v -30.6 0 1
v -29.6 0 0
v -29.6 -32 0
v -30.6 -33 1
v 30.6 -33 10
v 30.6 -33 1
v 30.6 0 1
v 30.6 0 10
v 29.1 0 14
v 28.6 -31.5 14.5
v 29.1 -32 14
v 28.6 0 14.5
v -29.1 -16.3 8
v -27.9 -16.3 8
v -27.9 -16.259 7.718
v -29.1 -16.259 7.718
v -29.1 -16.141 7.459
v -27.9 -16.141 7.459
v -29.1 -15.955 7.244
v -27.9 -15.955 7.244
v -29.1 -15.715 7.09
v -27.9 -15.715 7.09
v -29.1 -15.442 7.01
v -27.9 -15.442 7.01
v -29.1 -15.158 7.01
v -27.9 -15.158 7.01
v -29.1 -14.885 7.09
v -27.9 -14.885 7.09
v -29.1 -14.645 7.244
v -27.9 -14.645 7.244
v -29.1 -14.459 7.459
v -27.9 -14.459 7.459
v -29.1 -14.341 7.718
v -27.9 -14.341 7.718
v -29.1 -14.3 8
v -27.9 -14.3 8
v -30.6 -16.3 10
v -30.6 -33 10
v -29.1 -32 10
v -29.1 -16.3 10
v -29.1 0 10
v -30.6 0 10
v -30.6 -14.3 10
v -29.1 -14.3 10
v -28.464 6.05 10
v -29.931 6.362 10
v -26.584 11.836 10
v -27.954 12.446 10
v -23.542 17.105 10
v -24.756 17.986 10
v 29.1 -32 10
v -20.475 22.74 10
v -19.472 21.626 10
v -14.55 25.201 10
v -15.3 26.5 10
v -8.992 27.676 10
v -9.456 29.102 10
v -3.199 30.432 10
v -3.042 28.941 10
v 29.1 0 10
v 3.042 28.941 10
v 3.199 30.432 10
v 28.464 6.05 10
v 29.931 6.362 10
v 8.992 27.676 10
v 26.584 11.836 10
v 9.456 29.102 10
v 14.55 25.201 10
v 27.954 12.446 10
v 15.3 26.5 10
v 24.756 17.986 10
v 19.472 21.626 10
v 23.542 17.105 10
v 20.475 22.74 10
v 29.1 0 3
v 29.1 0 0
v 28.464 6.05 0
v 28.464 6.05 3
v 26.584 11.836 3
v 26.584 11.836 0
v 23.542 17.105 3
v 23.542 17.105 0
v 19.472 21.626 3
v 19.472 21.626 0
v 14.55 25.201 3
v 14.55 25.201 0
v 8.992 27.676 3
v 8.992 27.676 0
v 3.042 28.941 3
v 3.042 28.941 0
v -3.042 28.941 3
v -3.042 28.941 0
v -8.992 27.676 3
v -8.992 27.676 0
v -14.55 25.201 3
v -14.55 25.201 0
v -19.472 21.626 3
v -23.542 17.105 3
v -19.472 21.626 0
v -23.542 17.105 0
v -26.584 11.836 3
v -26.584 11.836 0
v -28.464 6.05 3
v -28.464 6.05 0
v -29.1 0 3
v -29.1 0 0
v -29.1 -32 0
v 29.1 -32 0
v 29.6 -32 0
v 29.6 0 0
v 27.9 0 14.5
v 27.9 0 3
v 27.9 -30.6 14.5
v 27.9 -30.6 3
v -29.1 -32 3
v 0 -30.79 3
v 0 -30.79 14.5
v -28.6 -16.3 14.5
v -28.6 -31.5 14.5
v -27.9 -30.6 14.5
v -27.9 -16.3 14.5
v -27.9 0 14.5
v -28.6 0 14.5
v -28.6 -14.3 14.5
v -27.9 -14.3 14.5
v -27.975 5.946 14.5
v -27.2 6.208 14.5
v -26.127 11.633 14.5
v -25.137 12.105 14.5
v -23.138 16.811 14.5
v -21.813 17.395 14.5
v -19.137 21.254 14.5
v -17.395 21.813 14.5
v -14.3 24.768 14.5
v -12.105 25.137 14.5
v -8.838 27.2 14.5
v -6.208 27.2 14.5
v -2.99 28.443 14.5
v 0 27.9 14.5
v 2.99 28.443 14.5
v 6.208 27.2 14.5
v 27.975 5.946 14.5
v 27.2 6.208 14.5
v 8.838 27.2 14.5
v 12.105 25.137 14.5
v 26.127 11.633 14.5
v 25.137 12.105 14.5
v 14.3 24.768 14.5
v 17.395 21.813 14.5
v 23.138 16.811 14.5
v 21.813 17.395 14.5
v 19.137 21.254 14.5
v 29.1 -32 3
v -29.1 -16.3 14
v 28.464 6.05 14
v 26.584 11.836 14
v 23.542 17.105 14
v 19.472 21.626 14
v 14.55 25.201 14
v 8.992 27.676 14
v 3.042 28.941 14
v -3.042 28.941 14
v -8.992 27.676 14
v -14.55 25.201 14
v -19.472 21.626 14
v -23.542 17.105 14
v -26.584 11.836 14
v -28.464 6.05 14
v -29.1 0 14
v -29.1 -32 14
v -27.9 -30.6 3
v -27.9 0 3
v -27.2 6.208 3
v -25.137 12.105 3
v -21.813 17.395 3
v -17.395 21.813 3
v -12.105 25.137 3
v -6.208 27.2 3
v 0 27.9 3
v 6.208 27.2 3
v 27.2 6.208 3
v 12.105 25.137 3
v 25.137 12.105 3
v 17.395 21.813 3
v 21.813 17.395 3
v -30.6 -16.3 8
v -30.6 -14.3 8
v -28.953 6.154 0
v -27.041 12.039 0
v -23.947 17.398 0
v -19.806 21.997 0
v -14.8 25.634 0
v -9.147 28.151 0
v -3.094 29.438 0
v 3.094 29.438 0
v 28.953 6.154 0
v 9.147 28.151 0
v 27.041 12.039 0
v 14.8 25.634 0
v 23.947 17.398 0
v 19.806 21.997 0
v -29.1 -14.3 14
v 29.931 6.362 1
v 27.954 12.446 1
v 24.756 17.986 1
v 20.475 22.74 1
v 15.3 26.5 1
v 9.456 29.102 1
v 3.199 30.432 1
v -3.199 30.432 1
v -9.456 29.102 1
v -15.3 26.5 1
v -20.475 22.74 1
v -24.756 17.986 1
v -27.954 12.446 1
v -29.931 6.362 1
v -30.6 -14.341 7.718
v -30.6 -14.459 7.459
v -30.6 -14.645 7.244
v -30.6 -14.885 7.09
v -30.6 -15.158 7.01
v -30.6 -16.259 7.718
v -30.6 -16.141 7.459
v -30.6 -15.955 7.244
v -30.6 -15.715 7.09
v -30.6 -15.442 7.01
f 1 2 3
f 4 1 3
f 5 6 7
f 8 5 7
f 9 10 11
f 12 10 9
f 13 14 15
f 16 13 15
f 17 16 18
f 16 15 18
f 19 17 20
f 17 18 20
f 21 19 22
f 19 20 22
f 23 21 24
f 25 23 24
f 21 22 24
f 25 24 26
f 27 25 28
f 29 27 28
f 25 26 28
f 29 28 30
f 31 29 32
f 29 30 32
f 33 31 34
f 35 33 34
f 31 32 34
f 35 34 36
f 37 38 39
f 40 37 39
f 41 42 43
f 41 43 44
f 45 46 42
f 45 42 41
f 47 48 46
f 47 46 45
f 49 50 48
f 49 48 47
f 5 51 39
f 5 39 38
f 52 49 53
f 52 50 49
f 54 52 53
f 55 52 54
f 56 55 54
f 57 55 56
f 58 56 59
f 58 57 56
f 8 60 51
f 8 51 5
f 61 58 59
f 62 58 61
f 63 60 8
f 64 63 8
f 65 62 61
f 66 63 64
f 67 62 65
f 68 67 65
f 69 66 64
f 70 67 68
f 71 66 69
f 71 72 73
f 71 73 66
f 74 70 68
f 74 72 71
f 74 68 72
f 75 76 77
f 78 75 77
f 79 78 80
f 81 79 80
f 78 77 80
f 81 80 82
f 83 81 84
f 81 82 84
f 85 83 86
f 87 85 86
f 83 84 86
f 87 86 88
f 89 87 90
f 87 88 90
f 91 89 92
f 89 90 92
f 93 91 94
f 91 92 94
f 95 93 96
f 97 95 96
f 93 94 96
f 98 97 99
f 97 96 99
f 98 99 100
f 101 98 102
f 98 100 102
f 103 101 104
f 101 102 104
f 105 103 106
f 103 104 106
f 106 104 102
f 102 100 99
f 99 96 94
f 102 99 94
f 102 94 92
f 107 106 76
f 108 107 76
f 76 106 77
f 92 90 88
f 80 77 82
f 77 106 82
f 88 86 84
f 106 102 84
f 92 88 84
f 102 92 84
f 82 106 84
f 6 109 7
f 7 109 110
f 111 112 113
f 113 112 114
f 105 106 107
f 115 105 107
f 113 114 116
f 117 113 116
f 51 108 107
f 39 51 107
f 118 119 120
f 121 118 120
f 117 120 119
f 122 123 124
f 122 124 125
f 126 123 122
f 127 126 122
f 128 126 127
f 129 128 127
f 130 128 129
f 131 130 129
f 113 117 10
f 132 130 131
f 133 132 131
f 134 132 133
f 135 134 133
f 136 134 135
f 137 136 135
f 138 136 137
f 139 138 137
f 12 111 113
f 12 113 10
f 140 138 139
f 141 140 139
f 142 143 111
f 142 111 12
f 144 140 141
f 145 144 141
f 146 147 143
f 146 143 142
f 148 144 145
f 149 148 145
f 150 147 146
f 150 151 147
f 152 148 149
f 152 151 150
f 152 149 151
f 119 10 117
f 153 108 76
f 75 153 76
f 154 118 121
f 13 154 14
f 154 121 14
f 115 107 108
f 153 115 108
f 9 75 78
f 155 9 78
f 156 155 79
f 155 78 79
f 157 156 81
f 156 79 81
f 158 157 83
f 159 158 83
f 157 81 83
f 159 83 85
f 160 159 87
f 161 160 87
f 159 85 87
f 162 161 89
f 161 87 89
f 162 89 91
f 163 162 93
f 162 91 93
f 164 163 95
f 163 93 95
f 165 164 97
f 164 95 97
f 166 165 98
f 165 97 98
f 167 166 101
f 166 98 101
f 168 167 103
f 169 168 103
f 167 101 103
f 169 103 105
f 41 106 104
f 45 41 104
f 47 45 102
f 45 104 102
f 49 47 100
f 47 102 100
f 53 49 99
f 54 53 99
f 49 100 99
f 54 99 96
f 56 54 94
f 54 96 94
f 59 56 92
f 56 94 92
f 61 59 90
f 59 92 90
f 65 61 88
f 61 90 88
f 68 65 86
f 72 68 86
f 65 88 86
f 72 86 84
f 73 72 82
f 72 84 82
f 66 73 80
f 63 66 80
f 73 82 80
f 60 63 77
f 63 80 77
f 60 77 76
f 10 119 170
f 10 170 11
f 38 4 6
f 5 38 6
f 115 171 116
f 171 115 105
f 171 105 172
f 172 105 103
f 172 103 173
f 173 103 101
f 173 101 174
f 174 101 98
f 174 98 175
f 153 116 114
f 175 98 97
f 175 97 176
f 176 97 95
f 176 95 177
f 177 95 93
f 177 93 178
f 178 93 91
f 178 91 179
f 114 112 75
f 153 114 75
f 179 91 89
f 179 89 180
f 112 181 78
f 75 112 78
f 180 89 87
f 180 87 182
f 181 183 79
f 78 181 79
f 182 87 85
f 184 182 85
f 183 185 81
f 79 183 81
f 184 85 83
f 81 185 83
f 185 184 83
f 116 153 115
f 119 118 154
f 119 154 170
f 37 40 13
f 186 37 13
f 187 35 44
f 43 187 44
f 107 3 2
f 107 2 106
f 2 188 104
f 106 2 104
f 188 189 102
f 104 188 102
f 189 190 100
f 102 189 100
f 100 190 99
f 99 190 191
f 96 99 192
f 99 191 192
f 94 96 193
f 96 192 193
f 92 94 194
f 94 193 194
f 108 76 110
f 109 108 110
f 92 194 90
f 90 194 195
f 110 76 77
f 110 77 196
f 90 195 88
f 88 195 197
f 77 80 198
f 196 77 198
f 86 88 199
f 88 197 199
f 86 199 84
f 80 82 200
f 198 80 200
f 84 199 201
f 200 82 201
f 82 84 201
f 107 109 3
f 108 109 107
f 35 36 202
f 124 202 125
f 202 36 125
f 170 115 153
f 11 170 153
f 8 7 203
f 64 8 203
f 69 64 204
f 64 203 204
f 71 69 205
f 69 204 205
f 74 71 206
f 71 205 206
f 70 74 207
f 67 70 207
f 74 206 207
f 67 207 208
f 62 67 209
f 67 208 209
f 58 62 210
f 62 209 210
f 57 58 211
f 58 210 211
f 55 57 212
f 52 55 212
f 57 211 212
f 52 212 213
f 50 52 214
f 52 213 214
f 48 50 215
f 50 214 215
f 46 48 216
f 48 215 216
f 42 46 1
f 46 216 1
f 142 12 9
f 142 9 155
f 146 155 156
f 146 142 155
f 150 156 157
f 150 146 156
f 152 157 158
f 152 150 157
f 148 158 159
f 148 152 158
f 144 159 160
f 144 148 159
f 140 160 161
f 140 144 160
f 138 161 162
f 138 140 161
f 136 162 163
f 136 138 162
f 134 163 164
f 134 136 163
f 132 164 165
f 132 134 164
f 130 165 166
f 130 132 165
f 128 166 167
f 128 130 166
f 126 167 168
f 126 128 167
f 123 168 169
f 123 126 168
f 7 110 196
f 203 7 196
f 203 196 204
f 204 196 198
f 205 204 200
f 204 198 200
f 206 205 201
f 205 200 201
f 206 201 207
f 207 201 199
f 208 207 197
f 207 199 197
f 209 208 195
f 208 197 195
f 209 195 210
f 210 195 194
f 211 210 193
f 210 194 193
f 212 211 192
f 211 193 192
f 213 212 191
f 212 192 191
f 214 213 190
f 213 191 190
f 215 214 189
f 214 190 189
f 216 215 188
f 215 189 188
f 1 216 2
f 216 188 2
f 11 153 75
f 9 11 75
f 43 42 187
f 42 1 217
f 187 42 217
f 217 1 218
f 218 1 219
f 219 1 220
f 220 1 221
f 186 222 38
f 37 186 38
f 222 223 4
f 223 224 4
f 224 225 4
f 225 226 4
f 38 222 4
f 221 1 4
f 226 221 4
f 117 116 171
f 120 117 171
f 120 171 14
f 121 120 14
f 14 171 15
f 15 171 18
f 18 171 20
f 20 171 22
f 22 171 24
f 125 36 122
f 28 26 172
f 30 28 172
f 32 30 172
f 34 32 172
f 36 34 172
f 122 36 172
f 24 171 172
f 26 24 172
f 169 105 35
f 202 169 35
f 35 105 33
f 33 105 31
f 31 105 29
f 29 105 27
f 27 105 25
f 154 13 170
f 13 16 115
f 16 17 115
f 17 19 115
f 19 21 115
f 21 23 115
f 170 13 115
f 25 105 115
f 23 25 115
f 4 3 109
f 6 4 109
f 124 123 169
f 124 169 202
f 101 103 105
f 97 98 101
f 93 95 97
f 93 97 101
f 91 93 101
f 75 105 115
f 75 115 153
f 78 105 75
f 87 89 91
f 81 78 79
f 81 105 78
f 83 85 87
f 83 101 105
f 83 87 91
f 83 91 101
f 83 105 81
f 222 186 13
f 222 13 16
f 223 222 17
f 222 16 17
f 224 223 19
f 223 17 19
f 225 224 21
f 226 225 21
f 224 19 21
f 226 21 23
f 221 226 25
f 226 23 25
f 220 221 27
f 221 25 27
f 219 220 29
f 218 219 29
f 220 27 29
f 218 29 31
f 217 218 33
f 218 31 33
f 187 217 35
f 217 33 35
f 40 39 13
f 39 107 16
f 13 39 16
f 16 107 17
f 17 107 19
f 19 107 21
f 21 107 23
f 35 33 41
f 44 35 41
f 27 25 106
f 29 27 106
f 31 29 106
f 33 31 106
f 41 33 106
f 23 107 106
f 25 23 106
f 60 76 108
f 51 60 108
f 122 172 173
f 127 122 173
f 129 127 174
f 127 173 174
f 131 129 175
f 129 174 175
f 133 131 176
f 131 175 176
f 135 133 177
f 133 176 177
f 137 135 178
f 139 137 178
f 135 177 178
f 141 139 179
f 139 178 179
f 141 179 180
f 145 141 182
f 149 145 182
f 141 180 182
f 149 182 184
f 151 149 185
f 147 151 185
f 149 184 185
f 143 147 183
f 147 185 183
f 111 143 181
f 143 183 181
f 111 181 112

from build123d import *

# Parameters (mm, degrees)
F3_DEPTH  = 3
F4_DEPTH  = 10
F5_SIZE   = 0.99999
F8_DEPTH  = 11.5
F9_SIZE   = 0.5
F11_DEPTH = 25


# Not quite as in the source:
# - a fillet or chamfer is up to 0.001 mm smaller than in the source, because OpenCascade refuses the exact size
# - a feature of the source that left no trace in its solid (it failed there, or was rolled back) is left out
# - a feature names something its author has since deleted; it is built from what else it names


with BuildPart() as f3:
    # F2 (on Top) → F3 (new body)
    with BuildSketch(Plane.XY):
        with BuildLine():
            Line((29.1, -9.4630861774), (29.1, 0))
            ThreePointArc((29.1, 0), (0, -29.1), (-29.1, 0))
            Line((-29.1, 0), (-29.1, -9.4630861774))
            ThreePointArc((-29.1, -9.4630861774), (0, -30.6), (29.1, -9.4630861774))
        make_face()
        with BuildLine():
            ThreePointArc((-29.1, 0), (0, -29.1), (29.1, 0))
            Line((29.1, 0), (-29.1, 0))
        make_face()
        with BuildLine():
            Line((-29.1, 0), (29.1, 0))
            ThreePointArc((29.1, 0), (0, 29.1), (-29.1, 0))
        make_face()
        with BuildLine():
            Line((29.1, -32), (29.1, -9.4630861774))
            ThreePointArc((29.1, -9.4630861774), (0, -30.6), (-29.1, -9.4630861774))
            Line((-29.1, -9.4630861774), (-29.1, -32))
            Line((-29.1, -32), (29.1, -32))
        make_face()
    extrude(amount=F3_DEPTH)


with BuildPart() as f4:
    # F2 (on Top) → F4 (new body)
    with BuildSketch(Plane.XY):
        with BuildLine():
            ThreePointArc((30.6, 0), (30.2226736077, -4.7906158268), (29.1, -9.4630861774))
            Line((29.1, -9.4630861774), (29.1, -32))
            Line((29.1, -32), (-29.1, -32))
            Line((-29.1, -32), (-29.1, -9.4630861774))
            ThreePointArc((-29.1, -9.4630861774), (-30.2226736077, -4.7906158268), (-30.6, 0))
            Line((-30.6, 0), (-30.6, -33))
            Line((-30.6, -33), (30.6, -33))
            Line((30.6, -33), (30.6, 0))
        make_face()
        with BuildLine():
            ThreePointArc((-29.1, 0), (0, 29.1), (29.1, 0))
            Line((29.1, 0), (29.1, -9.4630861774))
            ThreePointArc((29.1, -9.4630861774), (30.2226736077, -4.7906158268), (30.6, 0))
            ThreePointArc((30.6, 0), (0, 30.6), (-30.6, 0))
            ThreePointArc((-30.6, 0), (-30.2226736077, -4.7906158268), (-29.1, -9.4630861774))
            Line((-29.1, -9.4630861774), (-29.1, 0))
        make_face()
    extrude(amount=F4_DEPTH)

    # F5 (size 1 in the source; OpenCascade refuses exactly that, so slightly less here)
    f5_edges = [f4.edges().sort_by_distance(p)[0] for p in [
        (30.6, -16.5, 0),
        (0, -33, 0),
        (-30.6, -16.5, 0),
        (0, 30.6, 0),
    ]]
    chamfer(f5_edges, length=F5_SIZE)


with BuildPart() as f8:
    # F6 (on face) → F8 (new body)
    with BuildSketch(Plane.XY.offset(3)):
        with BuildLine():
            Line((29.1, -32), (29.1, 0))
            ThreePointArc((29.1, 0), (0, 29.1), (-29.1, 0))
            Line((-29.1, 0), (-29.1, -32))
            Line((-29.1, -32), (29.1, -32))
        make_face()
        with BuildLine():
            ThreePointArc((-27.9, 0), (0, 27.9), (27.9, 0))
            Line((27.9, 0), (27.9, -30.6))
            Line((27.9, -30.6), (0, -30.7904947549))
            Line((0, -30.7904947549), (-27.9, -30.6))
            Line((-27.9, -30.6), (-27.9, 0))
        make_face(mode=Mode.SUBTRACT)
    extrude(amount=F8_DEPTH)

    # F9
    f9_edges = [f8.edges().sort_by_distance(p)[0] for p in [
        (-29.1, -16, 14.5),
        (0, 29.1, 14.5),
        (29.1, -16, 14.5),
        (0, -32, 14.5),
    ]]
    chamfer(f9_edges, length=F9_SIZE)


with BuildPart() as f11_tool:
    # F10 (on face) → F11 (new body)
    with BuildSketch(Plane.YZ.offset(-27.9)):
        with BuildLine():
            ThreePointArc((-16.3, 8), (-15.3, 7), (-14.3, 8))
            ThreePointArc((-14.3, 8), (-15.3, 9), (-16.3, 8))
        make_face()
        with BuildLine():
            ThreePointArc((-16.3, 8), (-15.3, 9), (-14.3, 8))
            Line((-14.3, 8), (-14.3, 14.5))
            Line((-14.3, 14.5), (-16.3, 14.5))
            Line((-16.3, 14.5), (-16.3, 8))
        make_face()
    extrude(amount=-F11_DEPTH)


with BuildPart() as f4_1:
    add(f4.part)

    # F11: cut by f11_tool
    add(f11_tool.part, mode=Mode.SUBTRACT)


with BuildPart() as f8_1:
    add(f8.part)

    # F11: cut by f11_tool
    add(f11_tool.part, mode=Mode.SUBTRACT)


solid = Compound([f3.part, f4_1.part, f8_1.part])
